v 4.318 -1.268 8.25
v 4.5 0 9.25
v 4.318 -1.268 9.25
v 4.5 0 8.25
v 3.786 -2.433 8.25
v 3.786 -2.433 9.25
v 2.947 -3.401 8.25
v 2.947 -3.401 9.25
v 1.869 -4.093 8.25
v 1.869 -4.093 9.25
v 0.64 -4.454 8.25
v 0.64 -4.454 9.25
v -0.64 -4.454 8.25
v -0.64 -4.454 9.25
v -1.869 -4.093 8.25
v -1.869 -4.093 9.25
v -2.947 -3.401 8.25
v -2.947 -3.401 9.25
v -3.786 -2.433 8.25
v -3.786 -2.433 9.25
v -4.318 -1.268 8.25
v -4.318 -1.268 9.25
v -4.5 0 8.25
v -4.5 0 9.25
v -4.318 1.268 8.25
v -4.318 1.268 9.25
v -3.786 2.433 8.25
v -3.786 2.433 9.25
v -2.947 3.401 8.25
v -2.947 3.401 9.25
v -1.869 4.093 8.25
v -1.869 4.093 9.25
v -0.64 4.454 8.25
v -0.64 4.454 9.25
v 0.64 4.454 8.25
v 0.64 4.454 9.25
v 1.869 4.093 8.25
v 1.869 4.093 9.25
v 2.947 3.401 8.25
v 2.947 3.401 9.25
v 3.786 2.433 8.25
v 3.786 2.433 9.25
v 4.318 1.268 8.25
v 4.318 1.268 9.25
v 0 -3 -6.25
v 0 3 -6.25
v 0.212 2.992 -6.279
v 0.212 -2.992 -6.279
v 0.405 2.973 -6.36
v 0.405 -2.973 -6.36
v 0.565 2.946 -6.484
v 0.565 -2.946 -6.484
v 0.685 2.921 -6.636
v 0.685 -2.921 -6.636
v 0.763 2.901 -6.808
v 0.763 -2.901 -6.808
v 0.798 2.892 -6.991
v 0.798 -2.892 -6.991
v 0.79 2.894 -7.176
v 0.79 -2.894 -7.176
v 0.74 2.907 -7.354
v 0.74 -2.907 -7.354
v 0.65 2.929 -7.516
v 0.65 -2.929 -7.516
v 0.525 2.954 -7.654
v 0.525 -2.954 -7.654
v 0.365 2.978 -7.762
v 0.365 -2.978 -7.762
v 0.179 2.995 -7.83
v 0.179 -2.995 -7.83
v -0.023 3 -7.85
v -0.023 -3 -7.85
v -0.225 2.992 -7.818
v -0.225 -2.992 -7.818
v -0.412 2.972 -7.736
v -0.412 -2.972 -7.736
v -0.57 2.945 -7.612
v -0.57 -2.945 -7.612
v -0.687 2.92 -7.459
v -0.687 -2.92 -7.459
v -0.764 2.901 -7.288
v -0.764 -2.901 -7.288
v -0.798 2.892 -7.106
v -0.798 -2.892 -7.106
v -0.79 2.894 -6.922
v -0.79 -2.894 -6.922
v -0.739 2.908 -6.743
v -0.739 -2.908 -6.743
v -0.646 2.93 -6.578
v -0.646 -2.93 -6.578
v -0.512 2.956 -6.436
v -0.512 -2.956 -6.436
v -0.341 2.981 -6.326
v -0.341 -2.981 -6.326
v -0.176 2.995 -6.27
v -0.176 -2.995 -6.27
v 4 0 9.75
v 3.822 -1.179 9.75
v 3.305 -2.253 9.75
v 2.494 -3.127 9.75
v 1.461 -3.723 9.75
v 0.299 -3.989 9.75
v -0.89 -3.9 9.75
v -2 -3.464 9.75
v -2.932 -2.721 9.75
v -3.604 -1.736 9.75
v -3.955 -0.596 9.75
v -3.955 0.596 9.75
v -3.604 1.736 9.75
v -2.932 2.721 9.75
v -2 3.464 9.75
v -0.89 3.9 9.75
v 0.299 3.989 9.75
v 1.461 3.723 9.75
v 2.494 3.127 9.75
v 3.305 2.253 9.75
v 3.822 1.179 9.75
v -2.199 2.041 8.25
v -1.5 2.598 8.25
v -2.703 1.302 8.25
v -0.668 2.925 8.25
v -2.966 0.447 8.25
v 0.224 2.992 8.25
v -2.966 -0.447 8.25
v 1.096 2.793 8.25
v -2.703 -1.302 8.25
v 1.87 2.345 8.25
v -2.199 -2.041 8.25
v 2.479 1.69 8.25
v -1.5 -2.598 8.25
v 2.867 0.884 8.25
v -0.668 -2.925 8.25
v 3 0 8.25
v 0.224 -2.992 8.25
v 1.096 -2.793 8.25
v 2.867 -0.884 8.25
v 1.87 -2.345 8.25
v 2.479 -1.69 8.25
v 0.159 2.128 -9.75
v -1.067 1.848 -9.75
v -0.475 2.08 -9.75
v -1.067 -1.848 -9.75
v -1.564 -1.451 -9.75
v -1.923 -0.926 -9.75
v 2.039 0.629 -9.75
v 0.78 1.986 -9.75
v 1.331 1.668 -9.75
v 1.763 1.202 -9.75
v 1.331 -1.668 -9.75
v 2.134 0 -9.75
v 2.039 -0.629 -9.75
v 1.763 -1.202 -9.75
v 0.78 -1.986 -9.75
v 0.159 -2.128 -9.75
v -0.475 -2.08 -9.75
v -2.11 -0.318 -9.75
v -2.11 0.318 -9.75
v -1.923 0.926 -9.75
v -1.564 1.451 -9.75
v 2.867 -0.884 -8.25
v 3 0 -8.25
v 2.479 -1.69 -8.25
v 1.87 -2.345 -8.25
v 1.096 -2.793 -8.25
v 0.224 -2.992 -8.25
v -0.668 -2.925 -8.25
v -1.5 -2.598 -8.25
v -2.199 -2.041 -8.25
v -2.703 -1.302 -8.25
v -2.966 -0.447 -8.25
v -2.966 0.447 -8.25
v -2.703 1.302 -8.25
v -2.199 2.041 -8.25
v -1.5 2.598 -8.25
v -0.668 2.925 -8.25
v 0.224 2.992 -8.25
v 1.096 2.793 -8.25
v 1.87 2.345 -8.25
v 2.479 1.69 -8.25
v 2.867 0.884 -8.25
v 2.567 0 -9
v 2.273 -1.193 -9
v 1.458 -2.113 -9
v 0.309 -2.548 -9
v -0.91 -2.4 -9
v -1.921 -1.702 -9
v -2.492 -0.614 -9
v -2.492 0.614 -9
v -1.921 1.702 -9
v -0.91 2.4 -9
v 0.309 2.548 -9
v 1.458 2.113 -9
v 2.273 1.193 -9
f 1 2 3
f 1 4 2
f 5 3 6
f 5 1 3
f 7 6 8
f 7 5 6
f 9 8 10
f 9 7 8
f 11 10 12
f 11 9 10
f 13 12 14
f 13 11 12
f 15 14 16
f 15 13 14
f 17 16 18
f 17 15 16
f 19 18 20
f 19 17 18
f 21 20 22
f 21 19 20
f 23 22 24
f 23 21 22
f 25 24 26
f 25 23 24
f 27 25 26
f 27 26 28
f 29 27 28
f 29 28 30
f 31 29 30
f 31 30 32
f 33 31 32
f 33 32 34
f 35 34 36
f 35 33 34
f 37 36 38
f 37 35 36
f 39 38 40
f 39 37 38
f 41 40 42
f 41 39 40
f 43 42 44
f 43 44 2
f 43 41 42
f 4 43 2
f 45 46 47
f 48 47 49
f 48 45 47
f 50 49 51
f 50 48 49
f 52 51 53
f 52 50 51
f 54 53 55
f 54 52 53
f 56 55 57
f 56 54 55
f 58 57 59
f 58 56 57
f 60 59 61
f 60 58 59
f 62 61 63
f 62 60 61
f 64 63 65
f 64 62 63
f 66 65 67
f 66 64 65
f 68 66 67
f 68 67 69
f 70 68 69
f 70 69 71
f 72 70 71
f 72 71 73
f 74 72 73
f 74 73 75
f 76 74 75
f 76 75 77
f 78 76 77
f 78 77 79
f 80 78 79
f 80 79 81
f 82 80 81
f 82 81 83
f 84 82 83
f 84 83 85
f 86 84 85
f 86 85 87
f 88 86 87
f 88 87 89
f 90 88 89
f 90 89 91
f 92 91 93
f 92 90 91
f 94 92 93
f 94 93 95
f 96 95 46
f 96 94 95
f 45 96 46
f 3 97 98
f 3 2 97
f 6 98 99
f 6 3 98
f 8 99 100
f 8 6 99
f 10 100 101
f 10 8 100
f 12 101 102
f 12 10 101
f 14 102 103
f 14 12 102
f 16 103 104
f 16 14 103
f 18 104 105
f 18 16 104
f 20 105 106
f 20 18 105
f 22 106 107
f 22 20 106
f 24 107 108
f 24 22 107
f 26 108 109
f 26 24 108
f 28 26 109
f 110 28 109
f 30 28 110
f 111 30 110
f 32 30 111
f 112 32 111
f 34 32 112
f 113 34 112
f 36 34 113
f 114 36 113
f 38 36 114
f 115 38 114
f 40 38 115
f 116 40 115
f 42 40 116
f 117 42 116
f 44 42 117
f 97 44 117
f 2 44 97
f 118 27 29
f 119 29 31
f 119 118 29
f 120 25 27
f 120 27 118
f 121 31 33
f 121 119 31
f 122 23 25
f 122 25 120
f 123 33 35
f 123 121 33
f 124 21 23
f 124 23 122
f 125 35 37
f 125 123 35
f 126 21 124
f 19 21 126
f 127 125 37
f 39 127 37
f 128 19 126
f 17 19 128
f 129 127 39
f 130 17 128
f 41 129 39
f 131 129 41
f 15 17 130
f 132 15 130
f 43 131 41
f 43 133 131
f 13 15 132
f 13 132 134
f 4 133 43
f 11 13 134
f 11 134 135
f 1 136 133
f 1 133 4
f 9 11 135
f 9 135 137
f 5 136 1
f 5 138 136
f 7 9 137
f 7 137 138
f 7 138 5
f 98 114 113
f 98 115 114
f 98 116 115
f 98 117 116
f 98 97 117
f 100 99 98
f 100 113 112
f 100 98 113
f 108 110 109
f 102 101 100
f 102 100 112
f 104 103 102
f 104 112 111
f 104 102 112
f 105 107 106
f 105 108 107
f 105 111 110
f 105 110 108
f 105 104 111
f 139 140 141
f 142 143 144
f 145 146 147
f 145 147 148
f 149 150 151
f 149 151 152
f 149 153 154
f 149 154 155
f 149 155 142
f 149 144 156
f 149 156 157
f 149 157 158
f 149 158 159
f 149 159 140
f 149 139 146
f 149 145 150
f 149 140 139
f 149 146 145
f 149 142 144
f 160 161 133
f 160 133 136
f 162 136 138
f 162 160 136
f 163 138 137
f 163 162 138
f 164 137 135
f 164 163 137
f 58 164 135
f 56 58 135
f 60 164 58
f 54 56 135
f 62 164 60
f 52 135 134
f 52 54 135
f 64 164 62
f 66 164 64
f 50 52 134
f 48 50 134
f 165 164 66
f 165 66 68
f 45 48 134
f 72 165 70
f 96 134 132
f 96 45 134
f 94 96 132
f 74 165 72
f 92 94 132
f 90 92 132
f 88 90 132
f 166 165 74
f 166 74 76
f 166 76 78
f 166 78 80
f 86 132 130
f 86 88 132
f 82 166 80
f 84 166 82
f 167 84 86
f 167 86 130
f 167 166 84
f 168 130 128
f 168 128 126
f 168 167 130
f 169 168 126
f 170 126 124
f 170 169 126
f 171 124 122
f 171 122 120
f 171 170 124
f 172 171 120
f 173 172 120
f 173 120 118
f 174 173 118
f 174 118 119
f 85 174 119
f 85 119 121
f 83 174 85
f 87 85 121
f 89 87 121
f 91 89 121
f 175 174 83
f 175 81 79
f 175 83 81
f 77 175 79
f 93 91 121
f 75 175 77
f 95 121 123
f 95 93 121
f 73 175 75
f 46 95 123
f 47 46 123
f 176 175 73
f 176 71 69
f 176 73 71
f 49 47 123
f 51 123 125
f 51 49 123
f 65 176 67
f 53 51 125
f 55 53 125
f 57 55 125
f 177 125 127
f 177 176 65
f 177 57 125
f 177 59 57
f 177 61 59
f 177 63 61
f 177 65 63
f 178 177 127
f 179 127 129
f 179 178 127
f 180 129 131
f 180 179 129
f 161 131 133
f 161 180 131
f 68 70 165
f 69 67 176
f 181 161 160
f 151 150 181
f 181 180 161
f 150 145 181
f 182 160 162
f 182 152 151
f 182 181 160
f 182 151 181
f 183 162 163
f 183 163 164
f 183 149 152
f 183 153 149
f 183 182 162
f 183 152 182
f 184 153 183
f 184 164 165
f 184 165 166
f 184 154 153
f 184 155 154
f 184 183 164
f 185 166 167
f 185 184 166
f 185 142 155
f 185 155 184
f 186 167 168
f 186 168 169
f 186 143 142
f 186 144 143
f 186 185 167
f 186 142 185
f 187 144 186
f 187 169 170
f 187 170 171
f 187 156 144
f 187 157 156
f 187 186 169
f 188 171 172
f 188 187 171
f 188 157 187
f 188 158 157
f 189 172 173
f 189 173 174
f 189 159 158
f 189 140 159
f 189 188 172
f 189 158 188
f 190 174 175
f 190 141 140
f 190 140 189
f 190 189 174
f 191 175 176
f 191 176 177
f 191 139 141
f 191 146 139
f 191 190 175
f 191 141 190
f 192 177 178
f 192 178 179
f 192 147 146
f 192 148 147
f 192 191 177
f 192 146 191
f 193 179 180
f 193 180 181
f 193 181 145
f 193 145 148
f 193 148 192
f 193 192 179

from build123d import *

# Parameters (mm, degrees)
WYTNIJ_WYCI_GNI_CIE1_DEPTH      = 12.643131022
WYTNIJ_WYCI_GNI_CIE1_DEPTH_BACK = 12.643131022
SZKIC2_R                        = 0.8


with BuildPart() as part:
    # Szkic1 → Obrót1 (revolve)
    with BuildSketch(Plane(origin=(0, 0, 0), x_dir=(1, 0, 0), z_dir=(0, 1, 0))):
        Polygon((0, -9.75), (4, -9.75), (4.5, -9.25), (4.5, -8.25), (3, -8.25), (3, 8.25), (2.133974596, 9.75), (0, 9.75), align=None)
    revolve(axis=Axis((0, 0, 9.75), (0, 0, -1)))

    # Szkic2 → Wytnij-wyciągnięcie1 (cut, two sides: drawn at the far end of the back side and taken through both)
    with BuildSketch(Plane(origin=(0, 0, 0), x_dir=(1, 0, 0), z_dir=(0, 1, 0)).offset(-WYTNIJ_WYCI_GNI_CIE1_DEPTH_BACK)):
        with Locations(Location((0, 7.05, 0), (0, 0, 270))):
            Circle(SZKIC2_R)
    extrude(amount=WYTNIJ_WYCI_GNI_CIE1_DEPTH + WYTNIJ_WYCI_GNI_CIE1_DEPTH_BACK, mode=Mode.SUBTRACT)


solid = part.part
